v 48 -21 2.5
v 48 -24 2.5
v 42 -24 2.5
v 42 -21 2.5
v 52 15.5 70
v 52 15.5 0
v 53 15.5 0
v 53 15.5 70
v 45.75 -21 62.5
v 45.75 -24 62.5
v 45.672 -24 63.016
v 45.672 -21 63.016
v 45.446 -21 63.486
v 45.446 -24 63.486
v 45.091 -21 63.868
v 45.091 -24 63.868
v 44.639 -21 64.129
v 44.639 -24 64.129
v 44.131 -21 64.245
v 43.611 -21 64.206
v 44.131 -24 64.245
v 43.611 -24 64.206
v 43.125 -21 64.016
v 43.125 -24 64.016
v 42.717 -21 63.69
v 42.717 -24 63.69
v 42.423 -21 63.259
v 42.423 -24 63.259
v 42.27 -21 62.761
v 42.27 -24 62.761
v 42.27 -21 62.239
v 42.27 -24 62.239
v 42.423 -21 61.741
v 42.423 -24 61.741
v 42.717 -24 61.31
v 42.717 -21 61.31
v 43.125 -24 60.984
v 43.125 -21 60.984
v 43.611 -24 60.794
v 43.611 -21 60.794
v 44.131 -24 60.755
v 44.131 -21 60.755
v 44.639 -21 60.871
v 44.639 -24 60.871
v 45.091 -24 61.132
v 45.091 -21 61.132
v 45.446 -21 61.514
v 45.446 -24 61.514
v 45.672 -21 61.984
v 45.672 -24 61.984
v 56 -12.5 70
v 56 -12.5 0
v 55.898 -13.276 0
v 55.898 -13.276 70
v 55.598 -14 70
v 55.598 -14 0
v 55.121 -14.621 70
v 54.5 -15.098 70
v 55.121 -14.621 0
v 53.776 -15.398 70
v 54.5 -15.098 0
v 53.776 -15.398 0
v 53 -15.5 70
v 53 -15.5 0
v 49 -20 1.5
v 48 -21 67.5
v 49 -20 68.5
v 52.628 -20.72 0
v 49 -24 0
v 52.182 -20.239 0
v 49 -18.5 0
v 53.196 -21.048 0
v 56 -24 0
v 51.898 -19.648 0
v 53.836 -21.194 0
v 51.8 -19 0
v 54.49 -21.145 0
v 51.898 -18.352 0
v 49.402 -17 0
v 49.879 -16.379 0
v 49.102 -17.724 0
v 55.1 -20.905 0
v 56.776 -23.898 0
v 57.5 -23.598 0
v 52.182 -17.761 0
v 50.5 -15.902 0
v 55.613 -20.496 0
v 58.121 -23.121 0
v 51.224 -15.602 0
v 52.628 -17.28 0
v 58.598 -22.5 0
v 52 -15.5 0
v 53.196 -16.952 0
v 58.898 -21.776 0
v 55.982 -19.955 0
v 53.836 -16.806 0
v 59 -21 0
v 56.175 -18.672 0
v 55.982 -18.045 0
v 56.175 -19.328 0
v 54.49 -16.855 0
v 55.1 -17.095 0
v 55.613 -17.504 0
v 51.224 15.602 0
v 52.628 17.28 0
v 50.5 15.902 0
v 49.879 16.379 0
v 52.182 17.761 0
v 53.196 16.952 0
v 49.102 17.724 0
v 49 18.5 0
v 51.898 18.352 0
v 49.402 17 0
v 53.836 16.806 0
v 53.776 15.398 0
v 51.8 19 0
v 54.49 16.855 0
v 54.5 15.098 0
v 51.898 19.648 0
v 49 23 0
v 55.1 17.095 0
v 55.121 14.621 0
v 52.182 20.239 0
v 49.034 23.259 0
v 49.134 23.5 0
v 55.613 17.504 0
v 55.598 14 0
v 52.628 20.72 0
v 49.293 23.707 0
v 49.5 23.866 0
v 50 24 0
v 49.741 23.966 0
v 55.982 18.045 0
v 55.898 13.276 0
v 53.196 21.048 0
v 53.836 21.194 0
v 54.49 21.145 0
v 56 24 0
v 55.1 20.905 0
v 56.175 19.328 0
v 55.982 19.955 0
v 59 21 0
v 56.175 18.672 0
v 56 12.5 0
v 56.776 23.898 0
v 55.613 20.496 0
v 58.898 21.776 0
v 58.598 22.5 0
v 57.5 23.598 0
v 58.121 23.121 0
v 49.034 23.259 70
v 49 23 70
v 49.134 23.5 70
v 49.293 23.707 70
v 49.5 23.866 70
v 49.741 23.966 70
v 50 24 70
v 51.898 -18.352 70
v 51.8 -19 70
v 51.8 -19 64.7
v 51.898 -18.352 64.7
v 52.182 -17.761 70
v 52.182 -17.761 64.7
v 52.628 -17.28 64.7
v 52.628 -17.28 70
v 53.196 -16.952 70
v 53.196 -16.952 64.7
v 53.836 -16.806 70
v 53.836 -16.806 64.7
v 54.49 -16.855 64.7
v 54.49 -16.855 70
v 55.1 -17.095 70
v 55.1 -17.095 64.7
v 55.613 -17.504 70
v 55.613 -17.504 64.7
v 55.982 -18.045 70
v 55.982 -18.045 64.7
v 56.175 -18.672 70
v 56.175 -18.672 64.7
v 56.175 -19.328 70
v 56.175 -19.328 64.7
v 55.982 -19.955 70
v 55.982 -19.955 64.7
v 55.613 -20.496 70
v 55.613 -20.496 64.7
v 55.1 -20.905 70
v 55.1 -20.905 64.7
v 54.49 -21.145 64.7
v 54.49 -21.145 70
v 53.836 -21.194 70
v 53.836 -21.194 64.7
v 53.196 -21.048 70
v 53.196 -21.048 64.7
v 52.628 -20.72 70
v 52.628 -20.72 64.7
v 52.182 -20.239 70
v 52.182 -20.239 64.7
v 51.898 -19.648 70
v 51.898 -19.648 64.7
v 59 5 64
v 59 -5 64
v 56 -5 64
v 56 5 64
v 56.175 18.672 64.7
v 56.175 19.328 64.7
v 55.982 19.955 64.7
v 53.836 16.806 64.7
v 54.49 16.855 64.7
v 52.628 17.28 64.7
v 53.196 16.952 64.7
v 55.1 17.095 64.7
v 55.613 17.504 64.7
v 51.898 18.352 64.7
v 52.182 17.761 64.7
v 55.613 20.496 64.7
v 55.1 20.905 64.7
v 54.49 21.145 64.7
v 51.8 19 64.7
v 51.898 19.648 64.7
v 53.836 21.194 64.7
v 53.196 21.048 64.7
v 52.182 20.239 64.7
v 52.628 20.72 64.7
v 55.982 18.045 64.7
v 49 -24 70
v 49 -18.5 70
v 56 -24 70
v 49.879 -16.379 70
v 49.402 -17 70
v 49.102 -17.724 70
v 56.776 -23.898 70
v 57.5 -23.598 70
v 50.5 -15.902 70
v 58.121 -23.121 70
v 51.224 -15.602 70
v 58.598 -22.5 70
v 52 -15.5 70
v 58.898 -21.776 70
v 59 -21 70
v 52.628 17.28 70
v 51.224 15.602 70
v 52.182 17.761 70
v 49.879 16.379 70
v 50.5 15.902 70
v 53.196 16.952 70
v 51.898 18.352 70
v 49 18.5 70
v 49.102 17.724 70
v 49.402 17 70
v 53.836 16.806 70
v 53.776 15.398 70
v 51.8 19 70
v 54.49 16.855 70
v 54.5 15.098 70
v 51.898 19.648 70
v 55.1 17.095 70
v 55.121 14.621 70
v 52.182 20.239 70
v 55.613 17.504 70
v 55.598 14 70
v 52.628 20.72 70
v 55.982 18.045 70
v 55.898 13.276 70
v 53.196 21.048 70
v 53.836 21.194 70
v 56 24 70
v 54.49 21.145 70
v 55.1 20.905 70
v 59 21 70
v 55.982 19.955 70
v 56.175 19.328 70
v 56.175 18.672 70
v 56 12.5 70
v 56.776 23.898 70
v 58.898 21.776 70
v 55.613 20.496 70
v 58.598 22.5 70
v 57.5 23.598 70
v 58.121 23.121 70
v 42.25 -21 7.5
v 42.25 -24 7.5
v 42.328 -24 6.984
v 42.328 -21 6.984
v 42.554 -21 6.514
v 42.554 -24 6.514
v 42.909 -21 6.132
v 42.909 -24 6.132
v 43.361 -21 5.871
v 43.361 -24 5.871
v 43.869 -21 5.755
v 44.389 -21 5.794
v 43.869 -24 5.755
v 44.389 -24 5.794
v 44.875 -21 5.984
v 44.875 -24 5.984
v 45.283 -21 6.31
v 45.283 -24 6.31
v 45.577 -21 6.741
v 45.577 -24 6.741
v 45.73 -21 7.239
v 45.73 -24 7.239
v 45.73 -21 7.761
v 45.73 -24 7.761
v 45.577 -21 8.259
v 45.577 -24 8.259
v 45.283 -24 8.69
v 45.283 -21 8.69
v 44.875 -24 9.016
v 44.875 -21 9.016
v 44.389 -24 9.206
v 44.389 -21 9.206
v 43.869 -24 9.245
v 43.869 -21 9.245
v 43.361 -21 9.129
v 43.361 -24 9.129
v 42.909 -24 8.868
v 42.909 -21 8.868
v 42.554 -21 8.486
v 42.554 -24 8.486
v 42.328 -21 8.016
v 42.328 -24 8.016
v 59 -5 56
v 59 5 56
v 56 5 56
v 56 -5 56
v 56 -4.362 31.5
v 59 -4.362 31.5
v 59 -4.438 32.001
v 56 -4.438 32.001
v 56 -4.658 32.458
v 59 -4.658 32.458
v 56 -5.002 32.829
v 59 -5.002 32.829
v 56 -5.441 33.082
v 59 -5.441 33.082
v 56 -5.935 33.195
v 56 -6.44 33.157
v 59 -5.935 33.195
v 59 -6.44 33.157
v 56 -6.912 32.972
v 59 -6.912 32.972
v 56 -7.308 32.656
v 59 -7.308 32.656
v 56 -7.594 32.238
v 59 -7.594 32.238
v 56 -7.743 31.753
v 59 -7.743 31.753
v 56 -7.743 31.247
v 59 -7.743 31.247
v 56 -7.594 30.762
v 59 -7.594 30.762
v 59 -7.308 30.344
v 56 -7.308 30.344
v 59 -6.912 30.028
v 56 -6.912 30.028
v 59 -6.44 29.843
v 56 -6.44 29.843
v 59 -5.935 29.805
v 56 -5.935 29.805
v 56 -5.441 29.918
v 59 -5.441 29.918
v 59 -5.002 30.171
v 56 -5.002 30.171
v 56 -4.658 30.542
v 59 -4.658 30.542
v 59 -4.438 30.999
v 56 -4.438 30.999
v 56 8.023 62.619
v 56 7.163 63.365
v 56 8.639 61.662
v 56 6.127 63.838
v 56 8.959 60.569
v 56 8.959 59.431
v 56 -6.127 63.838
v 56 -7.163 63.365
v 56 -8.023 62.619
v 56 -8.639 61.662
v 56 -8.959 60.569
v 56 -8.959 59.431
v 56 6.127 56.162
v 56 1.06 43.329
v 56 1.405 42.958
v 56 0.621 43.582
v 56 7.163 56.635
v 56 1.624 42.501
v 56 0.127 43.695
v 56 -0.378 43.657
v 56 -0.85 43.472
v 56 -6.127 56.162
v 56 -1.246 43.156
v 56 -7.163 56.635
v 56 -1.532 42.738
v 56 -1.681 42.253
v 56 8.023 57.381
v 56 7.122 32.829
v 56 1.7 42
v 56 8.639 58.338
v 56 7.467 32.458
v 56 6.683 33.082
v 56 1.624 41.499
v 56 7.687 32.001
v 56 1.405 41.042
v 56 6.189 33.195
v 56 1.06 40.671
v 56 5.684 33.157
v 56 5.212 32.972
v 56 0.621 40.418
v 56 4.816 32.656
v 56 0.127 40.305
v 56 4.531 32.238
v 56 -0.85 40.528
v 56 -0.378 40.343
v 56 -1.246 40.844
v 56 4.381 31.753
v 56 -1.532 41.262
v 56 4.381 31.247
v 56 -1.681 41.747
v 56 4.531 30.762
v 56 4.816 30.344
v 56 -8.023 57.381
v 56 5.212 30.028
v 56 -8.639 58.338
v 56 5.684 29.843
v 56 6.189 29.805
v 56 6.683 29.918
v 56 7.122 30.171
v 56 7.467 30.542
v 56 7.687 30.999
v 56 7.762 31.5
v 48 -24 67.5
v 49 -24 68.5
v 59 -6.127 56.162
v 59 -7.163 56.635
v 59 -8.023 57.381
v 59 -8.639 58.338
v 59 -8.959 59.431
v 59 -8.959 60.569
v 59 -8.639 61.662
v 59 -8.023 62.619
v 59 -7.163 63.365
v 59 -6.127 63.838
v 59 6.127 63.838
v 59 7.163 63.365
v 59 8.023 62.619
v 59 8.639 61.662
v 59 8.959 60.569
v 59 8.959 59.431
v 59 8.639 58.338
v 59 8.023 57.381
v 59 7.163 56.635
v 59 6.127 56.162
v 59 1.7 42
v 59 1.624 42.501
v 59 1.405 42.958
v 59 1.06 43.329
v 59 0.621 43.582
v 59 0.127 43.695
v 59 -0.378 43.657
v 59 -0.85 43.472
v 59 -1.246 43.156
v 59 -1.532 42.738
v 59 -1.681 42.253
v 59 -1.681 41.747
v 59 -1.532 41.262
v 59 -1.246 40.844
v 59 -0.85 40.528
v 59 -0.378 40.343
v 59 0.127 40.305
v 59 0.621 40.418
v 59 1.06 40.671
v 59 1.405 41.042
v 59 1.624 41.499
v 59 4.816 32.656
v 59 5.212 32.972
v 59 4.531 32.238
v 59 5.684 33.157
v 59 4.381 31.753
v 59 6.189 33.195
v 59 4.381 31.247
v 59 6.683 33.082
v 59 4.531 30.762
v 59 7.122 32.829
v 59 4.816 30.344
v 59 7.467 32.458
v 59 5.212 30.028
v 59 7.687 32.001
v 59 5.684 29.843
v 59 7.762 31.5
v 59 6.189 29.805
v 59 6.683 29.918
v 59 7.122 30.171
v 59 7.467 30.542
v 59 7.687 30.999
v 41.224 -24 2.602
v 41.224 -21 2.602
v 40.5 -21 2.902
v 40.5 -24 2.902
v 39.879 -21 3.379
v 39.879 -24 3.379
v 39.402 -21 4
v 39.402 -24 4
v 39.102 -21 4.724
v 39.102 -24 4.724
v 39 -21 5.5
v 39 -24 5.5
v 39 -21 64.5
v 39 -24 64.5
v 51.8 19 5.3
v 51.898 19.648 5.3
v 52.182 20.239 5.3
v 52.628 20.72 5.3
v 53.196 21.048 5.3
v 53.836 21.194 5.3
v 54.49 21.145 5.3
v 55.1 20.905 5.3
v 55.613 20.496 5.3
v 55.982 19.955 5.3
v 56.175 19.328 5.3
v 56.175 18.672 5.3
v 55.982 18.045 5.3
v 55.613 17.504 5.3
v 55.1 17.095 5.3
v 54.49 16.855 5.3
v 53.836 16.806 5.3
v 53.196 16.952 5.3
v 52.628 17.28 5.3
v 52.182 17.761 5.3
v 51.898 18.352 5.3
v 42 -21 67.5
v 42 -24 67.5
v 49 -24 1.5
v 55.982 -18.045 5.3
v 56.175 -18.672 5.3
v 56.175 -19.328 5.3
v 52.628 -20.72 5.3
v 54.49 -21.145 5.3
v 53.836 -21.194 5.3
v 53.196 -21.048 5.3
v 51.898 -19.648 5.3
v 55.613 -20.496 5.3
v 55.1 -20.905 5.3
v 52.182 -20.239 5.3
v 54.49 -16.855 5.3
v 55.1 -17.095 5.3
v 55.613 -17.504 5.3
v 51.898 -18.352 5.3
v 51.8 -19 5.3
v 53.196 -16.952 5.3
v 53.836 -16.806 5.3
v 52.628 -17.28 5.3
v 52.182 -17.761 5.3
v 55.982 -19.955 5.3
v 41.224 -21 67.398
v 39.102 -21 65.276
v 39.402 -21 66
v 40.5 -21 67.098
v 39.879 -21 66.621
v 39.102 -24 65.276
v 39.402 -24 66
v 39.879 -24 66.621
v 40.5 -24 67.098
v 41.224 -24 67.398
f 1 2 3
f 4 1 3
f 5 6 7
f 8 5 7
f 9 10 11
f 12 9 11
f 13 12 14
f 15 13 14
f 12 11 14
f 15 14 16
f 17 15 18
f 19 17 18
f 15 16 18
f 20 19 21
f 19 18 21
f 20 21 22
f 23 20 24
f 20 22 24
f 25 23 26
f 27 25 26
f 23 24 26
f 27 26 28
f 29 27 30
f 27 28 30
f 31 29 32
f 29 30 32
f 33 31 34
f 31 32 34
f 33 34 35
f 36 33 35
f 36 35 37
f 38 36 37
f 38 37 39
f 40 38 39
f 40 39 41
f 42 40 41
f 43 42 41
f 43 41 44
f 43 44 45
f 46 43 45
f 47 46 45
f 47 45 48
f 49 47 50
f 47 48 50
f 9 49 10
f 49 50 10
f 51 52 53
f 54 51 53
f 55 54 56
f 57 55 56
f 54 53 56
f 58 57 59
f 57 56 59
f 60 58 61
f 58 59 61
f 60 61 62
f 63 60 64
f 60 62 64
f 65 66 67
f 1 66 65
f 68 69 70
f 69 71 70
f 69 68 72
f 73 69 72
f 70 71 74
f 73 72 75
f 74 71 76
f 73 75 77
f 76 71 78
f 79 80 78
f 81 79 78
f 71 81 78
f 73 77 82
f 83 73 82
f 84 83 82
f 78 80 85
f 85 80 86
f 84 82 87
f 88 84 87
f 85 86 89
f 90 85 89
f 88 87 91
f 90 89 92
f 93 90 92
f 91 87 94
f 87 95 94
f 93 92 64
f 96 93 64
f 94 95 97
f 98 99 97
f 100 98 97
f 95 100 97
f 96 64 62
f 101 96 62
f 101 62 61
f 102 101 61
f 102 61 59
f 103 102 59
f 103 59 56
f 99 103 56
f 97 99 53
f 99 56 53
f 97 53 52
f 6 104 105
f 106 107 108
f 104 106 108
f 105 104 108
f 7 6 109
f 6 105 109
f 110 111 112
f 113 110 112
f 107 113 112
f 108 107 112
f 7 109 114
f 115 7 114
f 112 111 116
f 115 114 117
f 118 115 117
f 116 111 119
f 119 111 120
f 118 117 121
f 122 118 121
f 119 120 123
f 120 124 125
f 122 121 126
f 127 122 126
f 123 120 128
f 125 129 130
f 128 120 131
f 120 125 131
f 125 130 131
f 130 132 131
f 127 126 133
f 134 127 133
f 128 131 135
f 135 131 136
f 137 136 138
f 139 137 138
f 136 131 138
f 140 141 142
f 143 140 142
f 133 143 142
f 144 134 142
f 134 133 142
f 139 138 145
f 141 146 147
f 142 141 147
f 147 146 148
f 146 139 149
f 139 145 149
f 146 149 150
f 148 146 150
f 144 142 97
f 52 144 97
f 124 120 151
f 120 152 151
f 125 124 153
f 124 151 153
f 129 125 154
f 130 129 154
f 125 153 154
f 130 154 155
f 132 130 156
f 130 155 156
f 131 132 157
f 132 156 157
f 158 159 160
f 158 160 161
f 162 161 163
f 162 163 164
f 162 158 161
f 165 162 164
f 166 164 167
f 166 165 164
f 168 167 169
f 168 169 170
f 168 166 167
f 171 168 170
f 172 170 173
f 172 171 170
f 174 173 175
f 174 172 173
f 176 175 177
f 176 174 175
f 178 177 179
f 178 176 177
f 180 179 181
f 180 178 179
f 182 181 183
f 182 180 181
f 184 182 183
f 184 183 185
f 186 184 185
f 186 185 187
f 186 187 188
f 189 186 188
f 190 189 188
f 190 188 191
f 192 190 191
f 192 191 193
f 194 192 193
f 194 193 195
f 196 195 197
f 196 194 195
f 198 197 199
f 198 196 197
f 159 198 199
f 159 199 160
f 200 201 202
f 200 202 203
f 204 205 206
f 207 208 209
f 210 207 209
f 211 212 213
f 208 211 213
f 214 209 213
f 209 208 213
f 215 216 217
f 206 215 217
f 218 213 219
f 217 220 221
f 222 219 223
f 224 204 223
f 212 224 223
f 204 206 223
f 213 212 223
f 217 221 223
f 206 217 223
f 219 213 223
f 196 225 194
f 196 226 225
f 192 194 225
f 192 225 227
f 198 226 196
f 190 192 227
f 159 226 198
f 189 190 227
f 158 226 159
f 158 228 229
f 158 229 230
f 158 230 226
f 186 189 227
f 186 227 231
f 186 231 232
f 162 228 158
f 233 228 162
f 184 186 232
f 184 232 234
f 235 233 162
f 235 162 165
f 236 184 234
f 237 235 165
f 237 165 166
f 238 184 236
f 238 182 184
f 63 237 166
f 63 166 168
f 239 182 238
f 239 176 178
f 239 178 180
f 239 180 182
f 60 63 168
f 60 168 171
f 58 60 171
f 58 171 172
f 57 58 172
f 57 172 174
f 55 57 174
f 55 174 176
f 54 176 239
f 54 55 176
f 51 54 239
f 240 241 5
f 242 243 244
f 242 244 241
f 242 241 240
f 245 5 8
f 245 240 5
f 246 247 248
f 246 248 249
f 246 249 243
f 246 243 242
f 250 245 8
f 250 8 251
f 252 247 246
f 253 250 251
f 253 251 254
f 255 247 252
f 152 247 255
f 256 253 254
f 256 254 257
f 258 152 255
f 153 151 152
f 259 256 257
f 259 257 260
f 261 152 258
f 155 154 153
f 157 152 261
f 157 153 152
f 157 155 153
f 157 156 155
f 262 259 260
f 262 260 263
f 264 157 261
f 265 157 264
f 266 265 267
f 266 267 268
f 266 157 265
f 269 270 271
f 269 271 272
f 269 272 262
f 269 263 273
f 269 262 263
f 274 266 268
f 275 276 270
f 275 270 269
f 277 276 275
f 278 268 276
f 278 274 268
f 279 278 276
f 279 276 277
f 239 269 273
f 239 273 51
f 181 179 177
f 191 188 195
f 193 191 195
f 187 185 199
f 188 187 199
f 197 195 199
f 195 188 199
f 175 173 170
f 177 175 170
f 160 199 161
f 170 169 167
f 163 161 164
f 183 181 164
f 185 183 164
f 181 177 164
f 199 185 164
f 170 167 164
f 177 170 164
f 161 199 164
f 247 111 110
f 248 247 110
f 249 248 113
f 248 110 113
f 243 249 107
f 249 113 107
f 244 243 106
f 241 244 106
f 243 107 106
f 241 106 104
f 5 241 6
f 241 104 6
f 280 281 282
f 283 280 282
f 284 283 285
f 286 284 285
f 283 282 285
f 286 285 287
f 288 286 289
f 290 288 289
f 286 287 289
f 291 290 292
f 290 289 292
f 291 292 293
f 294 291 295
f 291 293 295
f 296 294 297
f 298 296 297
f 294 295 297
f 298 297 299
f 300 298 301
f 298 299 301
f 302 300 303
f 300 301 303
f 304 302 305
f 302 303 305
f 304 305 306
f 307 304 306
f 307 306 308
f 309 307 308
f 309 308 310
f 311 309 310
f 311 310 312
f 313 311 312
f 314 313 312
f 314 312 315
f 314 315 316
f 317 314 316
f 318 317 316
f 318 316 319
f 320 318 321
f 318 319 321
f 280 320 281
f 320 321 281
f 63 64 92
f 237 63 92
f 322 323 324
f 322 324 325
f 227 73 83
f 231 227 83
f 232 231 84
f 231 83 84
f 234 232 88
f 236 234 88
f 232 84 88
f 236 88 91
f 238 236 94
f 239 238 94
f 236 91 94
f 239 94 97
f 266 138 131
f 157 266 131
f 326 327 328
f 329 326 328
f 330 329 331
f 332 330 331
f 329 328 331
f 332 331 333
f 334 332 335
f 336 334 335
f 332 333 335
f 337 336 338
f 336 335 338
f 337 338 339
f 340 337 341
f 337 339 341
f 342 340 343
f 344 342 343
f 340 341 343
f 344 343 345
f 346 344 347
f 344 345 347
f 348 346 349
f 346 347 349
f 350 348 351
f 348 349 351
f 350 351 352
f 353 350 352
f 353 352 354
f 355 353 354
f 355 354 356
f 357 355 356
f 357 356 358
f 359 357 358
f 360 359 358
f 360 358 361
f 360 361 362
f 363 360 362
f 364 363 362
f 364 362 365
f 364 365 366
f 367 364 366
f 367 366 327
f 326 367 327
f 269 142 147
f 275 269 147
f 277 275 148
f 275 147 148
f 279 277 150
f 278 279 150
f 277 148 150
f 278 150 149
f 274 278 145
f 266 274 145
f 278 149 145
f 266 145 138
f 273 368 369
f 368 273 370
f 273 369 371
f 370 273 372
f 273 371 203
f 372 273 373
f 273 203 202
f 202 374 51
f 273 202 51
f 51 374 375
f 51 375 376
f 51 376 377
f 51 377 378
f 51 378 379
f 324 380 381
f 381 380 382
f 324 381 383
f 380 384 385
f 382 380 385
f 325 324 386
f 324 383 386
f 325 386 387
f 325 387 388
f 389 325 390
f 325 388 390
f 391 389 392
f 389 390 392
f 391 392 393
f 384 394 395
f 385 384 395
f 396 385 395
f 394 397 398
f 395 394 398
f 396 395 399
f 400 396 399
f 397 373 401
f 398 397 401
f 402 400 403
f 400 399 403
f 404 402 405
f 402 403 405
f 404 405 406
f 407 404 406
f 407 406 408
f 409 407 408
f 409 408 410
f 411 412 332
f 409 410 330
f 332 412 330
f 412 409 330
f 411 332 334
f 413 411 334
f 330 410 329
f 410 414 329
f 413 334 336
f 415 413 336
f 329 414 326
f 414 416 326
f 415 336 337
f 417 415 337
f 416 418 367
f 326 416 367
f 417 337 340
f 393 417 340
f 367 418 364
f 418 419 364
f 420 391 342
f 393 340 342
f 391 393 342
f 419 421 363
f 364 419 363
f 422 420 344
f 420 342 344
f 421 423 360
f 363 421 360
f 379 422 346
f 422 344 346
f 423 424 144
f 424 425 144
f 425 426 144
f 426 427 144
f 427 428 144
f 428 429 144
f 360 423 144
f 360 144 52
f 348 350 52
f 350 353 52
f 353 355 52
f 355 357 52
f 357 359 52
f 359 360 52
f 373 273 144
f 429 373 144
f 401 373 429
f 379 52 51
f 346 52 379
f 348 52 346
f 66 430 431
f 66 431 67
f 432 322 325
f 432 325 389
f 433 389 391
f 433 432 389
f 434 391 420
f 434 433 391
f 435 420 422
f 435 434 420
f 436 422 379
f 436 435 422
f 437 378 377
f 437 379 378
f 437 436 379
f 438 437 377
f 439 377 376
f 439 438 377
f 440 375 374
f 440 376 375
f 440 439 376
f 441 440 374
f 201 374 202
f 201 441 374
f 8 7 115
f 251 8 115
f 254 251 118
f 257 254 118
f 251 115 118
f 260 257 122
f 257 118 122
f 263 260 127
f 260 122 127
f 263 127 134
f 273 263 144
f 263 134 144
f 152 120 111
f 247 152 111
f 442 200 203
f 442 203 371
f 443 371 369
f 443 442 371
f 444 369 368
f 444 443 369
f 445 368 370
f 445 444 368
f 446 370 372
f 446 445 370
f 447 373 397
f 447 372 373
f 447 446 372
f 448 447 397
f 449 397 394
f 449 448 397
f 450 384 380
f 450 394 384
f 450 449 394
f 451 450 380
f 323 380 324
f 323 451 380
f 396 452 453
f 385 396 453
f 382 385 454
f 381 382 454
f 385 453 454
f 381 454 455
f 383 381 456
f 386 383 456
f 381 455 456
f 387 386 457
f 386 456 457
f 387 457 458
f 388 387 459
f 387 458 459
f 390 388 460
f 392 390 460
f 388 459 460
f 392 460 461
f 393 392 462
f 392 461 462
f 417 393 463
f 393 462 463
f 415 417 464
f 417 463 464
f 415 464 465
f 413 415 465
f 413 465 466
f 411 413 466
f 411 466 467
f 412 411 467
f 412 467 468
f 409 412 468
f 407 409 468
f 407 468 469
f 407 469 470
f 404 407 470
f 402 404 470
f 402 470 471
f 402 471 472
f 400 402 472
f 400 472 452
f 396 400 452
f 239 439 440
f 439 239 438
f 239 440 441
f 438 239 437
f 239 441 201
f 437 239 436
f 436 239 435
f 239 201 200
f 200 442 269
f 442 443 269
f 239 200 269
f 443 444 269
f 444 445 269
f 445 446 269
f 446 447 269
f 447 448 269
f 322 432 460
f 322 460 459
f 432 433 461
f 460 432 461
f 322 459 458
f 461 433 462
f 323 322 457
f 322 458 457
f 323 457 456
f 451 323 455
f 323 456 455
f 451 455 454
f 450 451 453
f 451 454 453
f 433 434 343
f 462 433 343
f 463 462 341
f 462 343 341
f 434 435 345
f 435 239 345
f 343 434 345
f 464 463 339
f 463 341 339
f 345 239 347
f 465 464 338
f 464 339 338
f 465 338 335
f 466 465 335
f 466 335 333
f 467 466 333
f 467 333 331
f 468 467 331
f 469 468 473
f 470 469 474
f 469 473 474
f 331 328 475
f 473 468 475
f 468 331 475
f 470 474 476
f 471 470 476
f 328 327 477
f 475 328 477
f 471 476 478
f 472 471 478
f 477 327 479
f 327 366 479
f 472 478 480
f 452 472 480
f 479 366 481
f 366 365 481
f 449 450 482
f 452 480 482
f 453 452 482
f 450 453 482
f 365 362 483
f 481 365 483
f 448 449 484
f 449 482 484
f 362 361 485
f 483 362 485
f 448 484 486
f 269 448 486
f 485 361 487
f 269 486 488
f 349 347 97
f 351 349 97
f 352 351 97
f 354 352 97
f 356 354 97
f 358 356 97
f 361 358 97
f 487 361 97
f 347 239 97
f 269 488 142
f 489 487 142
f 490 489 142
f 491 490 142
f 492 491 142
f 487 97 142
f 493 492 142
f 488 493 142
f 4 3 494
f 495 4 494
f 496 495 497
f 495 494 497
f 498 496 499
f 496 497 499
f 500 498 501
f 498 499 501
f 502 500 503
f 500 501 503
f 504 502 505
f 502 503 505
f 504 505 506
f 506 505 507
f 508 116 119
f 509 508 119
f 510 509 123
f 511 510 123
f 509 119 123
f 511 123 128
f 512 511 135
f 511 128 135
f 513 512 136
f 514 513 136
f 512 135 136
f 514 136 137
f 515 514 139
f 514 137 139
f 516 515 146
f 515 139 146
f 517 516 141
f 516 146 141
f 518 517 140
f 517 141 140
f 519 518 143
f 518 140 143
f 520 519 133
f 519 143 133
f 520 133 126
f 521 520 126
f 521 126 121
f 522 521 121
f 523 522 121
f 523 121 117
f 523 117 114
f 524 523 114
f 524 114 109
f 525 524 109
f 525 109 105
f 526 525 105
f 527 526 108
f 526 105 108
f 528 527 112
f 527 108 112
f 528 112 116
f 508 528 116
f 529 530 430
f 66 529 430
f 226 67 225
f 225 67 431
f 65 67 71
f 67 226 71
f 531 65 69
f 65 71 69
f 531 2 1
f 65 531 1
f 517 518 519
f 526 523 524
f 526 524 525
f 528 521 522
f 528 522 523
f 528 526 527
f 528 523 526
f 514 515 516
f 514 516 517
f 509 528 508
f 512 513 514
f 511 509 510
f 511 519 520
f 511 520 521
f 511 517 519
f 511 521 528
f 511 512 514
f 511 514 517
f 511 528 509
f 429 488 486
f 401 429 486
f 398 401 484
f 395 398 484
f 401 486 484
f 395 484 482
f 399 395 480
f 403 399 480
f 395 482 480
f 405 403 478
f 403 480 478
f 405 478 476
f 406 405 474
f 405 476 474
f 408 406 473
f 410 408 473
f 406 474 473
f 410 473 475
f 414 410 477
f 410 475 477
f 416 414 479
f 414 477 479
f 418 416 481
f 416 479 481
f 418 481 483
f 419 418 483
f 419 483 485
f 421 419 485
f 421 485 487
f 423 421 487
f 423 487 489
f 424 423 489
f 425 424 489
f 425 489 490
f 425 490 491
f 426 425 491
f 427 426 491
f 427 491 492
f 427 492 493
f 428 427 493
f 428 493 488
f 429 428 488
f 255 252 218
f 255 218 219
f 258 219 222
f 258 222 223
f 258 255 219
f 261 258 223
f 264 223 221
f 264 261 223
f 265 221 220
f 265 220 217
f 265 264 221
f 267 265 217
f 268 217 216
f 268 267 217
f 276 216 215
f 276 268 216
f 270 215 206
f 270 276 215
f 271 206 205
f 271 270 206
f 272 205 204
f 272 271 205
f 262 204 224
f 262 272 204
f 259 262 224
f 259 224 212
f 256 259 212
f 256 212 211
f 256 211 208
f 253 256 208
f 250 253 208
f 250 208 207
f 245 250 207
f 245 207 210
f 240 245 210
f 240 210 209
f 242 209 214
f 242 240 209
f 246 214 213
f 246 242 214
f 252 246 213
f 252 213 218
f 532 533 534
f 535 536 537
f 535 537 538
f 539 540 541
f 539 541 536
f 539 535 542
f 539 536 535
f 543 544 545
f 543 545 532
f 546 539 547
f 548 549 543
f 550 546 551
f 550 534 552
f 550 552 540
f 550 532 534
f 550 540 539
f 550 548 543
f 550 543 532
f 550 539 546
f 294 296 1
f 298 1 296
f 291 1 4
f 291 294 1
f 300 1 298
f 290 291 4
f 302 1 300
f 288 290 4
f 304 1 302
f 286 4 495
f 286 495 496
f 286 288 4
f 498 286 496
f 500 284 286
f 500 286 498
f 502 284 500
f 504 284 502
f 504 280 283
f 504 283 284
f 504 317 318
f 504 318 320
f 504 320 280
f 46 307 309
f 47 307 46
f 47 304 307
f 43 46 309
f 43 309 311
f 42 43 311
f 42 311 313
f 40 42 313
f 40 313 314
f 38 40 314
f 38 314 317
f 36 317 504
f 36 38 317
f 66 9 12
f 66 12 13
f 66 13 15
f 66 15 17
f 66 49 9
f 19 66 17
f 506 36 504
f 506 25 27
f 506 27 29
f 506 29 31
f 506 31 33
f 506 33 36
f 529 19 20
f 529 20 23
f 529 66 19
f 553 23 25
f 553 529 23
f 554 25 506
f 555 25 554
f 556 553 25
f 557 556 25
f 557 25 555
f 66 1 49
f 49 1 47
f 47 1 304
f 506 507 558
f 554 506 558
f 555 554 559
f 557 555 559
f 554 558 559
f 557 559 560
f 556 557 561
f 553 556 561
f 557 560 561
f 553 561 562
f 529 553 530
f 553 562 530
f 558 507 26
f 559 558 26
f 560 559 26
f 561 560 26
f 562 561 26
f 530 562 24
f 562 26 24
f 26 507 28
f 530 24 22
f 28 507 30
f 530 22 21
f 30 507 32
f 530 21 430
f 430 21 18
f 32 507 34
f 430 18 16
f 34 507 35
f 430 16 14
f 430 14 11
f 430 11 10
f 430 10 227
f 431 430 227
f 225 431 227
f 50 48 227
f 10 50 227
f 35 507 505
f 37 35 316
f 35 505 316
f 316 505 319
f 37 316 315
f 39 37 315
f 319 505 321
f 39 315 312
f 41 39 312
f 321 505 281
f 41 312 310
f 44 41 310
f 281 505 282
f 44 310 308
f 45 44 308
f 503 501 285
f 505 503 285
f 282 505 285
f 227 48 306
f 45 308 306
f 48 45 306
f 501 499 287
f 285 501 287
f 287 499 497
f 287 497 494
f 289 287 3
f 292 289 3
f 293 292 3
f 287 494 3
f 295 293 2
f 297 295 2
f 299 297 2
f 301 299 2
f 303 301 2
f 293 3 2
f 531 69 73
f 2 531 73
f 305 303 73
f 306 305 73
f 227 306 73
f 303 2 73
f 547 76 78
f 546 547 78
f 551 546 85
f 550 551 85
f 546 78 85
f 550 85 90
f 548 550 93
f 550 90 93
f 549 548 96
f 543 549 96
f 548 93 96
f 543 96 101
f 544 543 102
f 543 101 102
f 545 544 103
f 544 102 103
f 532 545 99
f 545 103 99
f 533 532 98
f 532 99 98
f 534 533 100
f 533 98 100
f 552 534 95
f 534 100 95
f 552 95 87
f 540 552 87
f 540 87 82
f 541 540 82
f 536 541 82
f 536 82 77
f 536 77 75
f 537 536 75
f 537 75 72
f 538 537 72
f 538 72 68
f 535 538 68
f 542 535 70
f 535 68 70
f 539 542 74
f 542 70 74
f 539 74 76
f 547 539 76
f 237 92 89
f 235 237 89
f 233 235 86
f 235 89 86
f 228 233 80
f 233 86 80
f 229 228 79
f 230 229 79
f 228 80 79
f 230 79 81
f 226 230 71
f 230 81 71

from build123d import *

# Parameters (mm, degrees)
BOSS_EXTRUDE1_DEPTH = 70
SKETCH2_R           = 2.2
CUT_EXTRUDE1_DEPTH  = 5.3
FILLET1_R           = 1
SKETCH4_R           = 1.7
CUT_EXTRUDE3_DEPTH  = 10
SKETCH5_R           = 1.75
BOSS_EXTRUDE2_DEPTH = 3
CHAMFER1_SIZE       = 1


with BuildPart() as part:
    # Sketch1 → Boss-Extrude1 (new body)
    with BuildSketch(Plane.XY):
        with BuildLine():
            Line((49, 24), (49, 18.5))
            ThreePointArc((49, 18.5), (49.878679656, 16.378679656), (52, 15.5))
            Line((52, 15.5), (53, 15.5))
            ThreePointArc((53, 15.5), (55.121320344, 14.621320344), (56, 12.5))
            Line((56, 12.5), (56, -12.5))
            ThreePointArc((56, -12.5), (55.121320344, -14.621320344), (53, -15.5))
            Line((53, -15.5), (52, -15.5))
            ThreePointArc((52, -15.5), (49.878679656, -16.378679656), (49, -18.5))
            Line((49, -18.5), (49, -24))
            Line((49, -24), (56, -24))
            ThreePointArc((56, -24), (58.121320344, -23.121320344), (59, -21))
            Line((59, -21), (59, 21))
            ThreePointArc((59, 21), (58.121320344, 23.121320344), (56, 24))
            Line((56, 24), (49, 24))
        make_face()
    extrude(amount=BOSS_EXTRUDE1_DEPTH)

    # Sketch2 → Cut-Extrude1 (cut)
    with BuildSketch(Plane(origin=(0, 0, 0), x_dir=(-1, 0, 0), z_dir=(0, 0, -1))):
        with Locations((-54, -19)):
            Circle(SKETCH2_R)
        with Locations((-54, 19)):
            Circle(SKETCH2_R)
    cut_extrude1 = extrude(amount=-CUT_EXTRUDE1_DEPTH, mode=Mode.SUBTRACT)

    # Mirror1: Cut-Extrude1 across plane
    add(cut_extrude1.mirror(Plane(origin=(0, 0, 35), x_dir=(1, 0, 0), z_dir=(0, 0, -1))), mode=Mode.SUBTRACT)

    # Fillet1
    fillet1_edges = [part.edges().sort_by_distance(p)[0] for p in [
        (49, 24, 35),
    ]]
    fillet(fillet1_edges, radius=FILLET1_R)

    # Sketch4 → Cut-Extrude3 (cut)
    with BuildSketch(Plane(origin=(59, 0, 0), x_dir=(0, 0, -1), z_dir=(1, 0, 0))):
        with Locations(Location((-42, 0, 0), (0, 0, 90))):
            Circle(SKETCH4_R)
        with Locations(Location((-31.5, 6.062177826, 0), (0, 0, 90))):
            Circle(SKETCH4_R)
        with Locations(Location((-31.5, -6.062177826, 0), (0, 0, 90))):
            Circle(SKETCH4_R)
        with BuildLine():
            Line((-64, -5), (-64, 5))
            ThreePointArc((-64, 5), (-60, 9), (-56, 5))
            Line((-56, 5), (-56, -5))
            ThreePointArc((-56, -5), (-60, -9), (-64, -5))
        make_face()
    extrude(amount=-CUT_EXTRUDE3_DEPTH, mode=Mode.SUBTRACT)

    # Sketch5 → Boss-Extrude2 (add)
    with BuildSketch(Plane.XZ.offset(24)):
        with BuildLine():
            Line((49, 2.5), (42, 2.5))
            ThreePointArc((42, 2.5), (39.878679656, 3.378679656), (39, 5.5))
            Line((39, 5.5), (39, 64.5))
            ThreePointArc((39, 64.5), (39.878679656, 66.621320344), (42, 67.5))
            Line((42, 67.5), (49, 67.5))
            Line((49, 67.5), (49, 2.5))
        make_face()
        with Locations((44, 62.5)):
            Circle(SKETCH5_R, mode=Mode.SUBTRACT)
        with Locations(Location((44, 7.5, 0), (0, 0, 180))):
            Circle(SKETCH5_R, mode=Mode.SUBTRACT)
    extrude(amount=-BOSS_EXTRUDE2_DEPTH)

    # Chamfer1
    chamfer1_edges = [part.edges().sort_by_distance(p)[0] for p in [
        (49, -21, 35),
        (49, -22.5, 67.5),
        (49, -22.5, 2.5),
    ]]
    chamfer(chamfer1_edges, length=CHAMFER1_SIZE)


solid = part.part
